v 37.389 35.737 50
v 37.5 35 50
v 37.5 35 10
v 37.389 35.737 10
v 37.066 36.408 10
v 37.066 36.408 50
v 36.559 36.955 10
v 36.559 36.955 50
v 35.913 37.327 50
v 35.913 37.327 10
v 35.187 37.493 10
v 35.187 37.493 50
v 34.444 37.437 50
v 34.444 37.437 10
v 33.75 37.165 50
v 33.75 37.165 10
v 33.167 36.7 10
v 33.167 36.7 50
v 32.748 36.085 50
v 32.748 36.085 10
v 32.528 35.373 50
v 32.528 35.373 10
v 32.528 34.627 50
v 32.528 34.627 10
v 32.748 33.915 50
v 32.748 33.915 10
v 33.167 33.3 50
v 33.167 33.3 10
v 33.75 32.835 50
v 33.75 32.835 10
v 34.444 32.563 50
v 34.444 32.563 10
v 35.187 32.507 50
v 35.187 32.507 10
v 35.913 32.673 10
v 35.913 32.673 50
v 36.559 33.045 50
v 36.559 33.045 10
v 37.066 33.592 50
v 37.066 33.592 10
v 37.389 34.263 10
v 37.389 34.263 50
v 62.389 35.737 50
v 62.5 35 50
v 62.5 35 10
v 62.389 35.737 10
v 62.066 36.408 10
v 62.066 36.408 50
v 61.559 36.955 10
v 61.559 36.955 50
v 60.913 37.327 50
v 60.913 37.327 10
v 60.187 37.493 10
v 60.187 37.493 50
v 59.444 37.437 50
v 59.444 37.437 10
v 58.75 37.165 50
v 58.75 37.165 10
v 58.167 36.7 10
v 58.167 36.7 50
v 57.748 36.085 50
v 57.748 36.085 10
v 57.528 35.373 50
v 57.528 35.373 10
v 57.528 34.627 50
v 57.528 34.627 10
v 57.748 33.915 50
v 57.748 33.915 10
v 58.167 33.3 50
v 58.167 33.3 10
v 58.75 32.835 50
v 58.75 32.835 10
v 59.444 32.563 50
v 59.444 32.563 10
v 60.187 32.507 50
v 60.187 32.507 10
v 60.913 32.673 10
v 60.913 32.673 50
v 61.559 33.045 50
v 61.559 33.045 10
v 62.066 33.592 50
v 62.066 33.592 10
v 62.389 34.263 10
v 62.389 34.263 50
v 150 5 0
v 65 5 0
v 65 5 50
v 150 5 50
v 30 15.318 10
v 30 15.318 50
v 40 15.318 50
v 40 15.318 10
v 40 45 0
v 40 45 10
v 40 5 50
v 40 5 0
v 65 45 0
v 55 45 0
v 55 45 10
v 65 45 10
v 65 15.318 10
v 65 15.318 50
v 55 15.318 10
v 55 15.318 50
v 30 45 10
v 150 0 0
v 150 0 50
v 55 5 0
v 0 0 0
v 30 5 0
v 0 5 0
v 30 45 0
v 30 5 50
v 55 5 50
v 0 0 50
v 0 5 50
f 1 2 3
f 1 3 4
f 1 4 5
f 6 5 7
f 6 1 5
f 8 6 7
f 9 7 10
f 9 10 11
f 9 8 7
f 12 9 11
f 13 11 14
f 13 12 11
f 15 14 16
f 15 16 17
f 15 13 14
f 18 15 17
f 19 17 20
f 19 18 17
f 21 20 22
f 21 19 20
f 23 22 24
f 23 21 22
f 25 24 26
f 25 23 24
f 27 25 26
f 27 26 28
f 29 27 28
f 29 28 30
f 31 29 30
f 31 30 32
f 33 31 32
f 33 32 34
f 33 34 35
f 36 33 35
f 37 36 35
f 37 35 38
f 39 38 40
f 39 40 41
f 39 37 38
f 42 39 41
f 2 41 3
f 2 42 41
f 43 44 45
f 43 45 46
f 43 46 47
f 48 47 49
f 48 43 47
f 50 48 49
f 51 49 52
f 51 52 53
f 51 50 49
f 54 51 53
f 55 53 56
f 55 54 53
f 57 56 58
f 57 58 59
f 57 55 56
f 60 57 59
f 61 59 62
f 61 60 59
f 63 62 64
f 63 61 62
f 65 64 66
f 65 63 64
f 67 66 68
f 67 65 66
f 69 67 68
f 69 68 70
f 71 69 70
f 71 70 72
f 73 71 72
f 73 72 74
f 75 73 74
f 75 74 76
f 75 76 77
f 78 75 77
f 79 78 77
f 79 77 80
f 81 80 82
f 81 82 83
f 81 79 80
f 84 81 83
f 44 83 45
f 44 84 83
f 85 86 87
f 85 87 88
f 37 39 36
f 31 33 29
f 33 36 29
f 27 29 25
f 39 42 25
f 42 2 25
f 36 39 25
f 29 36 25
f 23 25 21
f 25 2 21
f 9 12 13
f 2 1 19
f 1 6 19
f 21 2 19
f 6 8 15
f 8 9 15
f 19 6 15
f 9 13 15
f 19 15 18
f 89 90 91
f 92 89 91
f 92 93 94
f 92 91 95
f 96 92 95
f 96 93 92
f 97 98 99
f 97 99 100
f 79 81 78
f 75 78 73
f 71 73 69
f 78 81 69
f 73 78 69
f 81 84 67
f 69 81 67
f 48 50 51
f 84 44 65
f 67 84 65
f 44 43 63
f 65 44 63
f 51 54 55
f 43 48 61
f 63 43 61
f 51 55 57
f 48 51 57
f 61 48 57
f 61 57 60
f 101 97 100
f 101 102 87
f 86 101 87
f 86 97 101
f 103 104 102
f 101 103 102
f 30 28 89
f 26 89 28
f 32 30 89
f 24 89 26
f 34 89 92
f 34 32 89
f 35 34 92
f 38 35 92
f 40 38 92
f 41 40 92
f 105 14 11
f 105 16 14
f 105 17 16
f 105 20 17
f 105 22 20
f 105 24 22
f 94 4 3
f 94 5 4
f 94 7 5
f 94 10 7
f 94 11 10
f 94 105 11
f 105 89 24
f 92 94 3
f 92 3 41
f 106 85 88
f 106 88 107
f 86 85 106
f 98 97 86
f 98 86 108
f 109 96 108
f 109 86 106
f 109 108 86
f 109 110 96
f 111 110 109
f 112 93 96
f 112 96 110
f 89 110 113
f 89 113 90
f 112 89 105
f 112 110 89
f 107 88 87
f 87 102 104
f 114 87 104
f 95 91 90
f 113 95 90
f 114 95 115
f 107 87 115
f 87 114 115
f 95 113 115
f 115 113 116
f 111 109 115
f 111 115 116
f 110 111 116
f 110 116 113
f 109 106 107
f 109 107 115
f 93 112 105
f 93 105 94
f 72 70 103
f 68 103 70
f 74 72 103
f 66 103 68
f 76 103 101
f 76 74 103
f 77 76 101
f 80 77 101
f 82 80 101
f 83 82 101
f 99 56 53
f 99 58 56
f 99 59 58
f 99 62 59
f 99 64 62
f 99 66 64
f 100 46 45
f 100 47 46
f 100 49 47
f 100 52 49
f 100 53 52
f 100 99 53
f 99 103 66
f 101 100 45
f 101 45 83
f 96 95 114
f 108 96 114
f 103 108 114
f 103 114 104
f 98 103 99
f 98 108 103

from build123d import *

# Parameters (mm, degrees)
BOSS_EXTRUDE1_DEPTH = 50
SKETCH2_W           = 35
SKETCH2_H           = 29.682212161
SKETCH2_R           = 2.5
CUT_EXTRUDE1_DEPTH  = 40


with BuildPart() as part:
    # Sketch1 → Boss-Extrude1 (new body)
    with BuildSketch(Plane.XY):
        Polygon((0, 5), (30, 5), (30, 45), (40, 45), (40, 5), (55, 5), (55, 45), (65, 45), (65, 5), (150, 5), (150, 0), (0, 0), align=None)
    extrude(amount=BOSS_EXTRUDE1_DEPTH)

    # Sketch2 → Cut-Extrude1 (cut)
    with BuildSketch(Plane.XY.offset(50)):
        with Locations((47.5, 30.15889392)):
            Rectangle(SKETCH2_W, SKETCH2_H)
        with Locations((35, 35)):
            Circle(SKETCH2_R, mode=Mode.SUBTRACT)
        with Locations((60, 35)):
            Circle(SKETCH2_R, mode=Mode.SUBTRACT)
    extrude(amount=-CUT_EXTRUDE1_DEPTH, mode=Mode.SUBTRACT)


solid = part.part
